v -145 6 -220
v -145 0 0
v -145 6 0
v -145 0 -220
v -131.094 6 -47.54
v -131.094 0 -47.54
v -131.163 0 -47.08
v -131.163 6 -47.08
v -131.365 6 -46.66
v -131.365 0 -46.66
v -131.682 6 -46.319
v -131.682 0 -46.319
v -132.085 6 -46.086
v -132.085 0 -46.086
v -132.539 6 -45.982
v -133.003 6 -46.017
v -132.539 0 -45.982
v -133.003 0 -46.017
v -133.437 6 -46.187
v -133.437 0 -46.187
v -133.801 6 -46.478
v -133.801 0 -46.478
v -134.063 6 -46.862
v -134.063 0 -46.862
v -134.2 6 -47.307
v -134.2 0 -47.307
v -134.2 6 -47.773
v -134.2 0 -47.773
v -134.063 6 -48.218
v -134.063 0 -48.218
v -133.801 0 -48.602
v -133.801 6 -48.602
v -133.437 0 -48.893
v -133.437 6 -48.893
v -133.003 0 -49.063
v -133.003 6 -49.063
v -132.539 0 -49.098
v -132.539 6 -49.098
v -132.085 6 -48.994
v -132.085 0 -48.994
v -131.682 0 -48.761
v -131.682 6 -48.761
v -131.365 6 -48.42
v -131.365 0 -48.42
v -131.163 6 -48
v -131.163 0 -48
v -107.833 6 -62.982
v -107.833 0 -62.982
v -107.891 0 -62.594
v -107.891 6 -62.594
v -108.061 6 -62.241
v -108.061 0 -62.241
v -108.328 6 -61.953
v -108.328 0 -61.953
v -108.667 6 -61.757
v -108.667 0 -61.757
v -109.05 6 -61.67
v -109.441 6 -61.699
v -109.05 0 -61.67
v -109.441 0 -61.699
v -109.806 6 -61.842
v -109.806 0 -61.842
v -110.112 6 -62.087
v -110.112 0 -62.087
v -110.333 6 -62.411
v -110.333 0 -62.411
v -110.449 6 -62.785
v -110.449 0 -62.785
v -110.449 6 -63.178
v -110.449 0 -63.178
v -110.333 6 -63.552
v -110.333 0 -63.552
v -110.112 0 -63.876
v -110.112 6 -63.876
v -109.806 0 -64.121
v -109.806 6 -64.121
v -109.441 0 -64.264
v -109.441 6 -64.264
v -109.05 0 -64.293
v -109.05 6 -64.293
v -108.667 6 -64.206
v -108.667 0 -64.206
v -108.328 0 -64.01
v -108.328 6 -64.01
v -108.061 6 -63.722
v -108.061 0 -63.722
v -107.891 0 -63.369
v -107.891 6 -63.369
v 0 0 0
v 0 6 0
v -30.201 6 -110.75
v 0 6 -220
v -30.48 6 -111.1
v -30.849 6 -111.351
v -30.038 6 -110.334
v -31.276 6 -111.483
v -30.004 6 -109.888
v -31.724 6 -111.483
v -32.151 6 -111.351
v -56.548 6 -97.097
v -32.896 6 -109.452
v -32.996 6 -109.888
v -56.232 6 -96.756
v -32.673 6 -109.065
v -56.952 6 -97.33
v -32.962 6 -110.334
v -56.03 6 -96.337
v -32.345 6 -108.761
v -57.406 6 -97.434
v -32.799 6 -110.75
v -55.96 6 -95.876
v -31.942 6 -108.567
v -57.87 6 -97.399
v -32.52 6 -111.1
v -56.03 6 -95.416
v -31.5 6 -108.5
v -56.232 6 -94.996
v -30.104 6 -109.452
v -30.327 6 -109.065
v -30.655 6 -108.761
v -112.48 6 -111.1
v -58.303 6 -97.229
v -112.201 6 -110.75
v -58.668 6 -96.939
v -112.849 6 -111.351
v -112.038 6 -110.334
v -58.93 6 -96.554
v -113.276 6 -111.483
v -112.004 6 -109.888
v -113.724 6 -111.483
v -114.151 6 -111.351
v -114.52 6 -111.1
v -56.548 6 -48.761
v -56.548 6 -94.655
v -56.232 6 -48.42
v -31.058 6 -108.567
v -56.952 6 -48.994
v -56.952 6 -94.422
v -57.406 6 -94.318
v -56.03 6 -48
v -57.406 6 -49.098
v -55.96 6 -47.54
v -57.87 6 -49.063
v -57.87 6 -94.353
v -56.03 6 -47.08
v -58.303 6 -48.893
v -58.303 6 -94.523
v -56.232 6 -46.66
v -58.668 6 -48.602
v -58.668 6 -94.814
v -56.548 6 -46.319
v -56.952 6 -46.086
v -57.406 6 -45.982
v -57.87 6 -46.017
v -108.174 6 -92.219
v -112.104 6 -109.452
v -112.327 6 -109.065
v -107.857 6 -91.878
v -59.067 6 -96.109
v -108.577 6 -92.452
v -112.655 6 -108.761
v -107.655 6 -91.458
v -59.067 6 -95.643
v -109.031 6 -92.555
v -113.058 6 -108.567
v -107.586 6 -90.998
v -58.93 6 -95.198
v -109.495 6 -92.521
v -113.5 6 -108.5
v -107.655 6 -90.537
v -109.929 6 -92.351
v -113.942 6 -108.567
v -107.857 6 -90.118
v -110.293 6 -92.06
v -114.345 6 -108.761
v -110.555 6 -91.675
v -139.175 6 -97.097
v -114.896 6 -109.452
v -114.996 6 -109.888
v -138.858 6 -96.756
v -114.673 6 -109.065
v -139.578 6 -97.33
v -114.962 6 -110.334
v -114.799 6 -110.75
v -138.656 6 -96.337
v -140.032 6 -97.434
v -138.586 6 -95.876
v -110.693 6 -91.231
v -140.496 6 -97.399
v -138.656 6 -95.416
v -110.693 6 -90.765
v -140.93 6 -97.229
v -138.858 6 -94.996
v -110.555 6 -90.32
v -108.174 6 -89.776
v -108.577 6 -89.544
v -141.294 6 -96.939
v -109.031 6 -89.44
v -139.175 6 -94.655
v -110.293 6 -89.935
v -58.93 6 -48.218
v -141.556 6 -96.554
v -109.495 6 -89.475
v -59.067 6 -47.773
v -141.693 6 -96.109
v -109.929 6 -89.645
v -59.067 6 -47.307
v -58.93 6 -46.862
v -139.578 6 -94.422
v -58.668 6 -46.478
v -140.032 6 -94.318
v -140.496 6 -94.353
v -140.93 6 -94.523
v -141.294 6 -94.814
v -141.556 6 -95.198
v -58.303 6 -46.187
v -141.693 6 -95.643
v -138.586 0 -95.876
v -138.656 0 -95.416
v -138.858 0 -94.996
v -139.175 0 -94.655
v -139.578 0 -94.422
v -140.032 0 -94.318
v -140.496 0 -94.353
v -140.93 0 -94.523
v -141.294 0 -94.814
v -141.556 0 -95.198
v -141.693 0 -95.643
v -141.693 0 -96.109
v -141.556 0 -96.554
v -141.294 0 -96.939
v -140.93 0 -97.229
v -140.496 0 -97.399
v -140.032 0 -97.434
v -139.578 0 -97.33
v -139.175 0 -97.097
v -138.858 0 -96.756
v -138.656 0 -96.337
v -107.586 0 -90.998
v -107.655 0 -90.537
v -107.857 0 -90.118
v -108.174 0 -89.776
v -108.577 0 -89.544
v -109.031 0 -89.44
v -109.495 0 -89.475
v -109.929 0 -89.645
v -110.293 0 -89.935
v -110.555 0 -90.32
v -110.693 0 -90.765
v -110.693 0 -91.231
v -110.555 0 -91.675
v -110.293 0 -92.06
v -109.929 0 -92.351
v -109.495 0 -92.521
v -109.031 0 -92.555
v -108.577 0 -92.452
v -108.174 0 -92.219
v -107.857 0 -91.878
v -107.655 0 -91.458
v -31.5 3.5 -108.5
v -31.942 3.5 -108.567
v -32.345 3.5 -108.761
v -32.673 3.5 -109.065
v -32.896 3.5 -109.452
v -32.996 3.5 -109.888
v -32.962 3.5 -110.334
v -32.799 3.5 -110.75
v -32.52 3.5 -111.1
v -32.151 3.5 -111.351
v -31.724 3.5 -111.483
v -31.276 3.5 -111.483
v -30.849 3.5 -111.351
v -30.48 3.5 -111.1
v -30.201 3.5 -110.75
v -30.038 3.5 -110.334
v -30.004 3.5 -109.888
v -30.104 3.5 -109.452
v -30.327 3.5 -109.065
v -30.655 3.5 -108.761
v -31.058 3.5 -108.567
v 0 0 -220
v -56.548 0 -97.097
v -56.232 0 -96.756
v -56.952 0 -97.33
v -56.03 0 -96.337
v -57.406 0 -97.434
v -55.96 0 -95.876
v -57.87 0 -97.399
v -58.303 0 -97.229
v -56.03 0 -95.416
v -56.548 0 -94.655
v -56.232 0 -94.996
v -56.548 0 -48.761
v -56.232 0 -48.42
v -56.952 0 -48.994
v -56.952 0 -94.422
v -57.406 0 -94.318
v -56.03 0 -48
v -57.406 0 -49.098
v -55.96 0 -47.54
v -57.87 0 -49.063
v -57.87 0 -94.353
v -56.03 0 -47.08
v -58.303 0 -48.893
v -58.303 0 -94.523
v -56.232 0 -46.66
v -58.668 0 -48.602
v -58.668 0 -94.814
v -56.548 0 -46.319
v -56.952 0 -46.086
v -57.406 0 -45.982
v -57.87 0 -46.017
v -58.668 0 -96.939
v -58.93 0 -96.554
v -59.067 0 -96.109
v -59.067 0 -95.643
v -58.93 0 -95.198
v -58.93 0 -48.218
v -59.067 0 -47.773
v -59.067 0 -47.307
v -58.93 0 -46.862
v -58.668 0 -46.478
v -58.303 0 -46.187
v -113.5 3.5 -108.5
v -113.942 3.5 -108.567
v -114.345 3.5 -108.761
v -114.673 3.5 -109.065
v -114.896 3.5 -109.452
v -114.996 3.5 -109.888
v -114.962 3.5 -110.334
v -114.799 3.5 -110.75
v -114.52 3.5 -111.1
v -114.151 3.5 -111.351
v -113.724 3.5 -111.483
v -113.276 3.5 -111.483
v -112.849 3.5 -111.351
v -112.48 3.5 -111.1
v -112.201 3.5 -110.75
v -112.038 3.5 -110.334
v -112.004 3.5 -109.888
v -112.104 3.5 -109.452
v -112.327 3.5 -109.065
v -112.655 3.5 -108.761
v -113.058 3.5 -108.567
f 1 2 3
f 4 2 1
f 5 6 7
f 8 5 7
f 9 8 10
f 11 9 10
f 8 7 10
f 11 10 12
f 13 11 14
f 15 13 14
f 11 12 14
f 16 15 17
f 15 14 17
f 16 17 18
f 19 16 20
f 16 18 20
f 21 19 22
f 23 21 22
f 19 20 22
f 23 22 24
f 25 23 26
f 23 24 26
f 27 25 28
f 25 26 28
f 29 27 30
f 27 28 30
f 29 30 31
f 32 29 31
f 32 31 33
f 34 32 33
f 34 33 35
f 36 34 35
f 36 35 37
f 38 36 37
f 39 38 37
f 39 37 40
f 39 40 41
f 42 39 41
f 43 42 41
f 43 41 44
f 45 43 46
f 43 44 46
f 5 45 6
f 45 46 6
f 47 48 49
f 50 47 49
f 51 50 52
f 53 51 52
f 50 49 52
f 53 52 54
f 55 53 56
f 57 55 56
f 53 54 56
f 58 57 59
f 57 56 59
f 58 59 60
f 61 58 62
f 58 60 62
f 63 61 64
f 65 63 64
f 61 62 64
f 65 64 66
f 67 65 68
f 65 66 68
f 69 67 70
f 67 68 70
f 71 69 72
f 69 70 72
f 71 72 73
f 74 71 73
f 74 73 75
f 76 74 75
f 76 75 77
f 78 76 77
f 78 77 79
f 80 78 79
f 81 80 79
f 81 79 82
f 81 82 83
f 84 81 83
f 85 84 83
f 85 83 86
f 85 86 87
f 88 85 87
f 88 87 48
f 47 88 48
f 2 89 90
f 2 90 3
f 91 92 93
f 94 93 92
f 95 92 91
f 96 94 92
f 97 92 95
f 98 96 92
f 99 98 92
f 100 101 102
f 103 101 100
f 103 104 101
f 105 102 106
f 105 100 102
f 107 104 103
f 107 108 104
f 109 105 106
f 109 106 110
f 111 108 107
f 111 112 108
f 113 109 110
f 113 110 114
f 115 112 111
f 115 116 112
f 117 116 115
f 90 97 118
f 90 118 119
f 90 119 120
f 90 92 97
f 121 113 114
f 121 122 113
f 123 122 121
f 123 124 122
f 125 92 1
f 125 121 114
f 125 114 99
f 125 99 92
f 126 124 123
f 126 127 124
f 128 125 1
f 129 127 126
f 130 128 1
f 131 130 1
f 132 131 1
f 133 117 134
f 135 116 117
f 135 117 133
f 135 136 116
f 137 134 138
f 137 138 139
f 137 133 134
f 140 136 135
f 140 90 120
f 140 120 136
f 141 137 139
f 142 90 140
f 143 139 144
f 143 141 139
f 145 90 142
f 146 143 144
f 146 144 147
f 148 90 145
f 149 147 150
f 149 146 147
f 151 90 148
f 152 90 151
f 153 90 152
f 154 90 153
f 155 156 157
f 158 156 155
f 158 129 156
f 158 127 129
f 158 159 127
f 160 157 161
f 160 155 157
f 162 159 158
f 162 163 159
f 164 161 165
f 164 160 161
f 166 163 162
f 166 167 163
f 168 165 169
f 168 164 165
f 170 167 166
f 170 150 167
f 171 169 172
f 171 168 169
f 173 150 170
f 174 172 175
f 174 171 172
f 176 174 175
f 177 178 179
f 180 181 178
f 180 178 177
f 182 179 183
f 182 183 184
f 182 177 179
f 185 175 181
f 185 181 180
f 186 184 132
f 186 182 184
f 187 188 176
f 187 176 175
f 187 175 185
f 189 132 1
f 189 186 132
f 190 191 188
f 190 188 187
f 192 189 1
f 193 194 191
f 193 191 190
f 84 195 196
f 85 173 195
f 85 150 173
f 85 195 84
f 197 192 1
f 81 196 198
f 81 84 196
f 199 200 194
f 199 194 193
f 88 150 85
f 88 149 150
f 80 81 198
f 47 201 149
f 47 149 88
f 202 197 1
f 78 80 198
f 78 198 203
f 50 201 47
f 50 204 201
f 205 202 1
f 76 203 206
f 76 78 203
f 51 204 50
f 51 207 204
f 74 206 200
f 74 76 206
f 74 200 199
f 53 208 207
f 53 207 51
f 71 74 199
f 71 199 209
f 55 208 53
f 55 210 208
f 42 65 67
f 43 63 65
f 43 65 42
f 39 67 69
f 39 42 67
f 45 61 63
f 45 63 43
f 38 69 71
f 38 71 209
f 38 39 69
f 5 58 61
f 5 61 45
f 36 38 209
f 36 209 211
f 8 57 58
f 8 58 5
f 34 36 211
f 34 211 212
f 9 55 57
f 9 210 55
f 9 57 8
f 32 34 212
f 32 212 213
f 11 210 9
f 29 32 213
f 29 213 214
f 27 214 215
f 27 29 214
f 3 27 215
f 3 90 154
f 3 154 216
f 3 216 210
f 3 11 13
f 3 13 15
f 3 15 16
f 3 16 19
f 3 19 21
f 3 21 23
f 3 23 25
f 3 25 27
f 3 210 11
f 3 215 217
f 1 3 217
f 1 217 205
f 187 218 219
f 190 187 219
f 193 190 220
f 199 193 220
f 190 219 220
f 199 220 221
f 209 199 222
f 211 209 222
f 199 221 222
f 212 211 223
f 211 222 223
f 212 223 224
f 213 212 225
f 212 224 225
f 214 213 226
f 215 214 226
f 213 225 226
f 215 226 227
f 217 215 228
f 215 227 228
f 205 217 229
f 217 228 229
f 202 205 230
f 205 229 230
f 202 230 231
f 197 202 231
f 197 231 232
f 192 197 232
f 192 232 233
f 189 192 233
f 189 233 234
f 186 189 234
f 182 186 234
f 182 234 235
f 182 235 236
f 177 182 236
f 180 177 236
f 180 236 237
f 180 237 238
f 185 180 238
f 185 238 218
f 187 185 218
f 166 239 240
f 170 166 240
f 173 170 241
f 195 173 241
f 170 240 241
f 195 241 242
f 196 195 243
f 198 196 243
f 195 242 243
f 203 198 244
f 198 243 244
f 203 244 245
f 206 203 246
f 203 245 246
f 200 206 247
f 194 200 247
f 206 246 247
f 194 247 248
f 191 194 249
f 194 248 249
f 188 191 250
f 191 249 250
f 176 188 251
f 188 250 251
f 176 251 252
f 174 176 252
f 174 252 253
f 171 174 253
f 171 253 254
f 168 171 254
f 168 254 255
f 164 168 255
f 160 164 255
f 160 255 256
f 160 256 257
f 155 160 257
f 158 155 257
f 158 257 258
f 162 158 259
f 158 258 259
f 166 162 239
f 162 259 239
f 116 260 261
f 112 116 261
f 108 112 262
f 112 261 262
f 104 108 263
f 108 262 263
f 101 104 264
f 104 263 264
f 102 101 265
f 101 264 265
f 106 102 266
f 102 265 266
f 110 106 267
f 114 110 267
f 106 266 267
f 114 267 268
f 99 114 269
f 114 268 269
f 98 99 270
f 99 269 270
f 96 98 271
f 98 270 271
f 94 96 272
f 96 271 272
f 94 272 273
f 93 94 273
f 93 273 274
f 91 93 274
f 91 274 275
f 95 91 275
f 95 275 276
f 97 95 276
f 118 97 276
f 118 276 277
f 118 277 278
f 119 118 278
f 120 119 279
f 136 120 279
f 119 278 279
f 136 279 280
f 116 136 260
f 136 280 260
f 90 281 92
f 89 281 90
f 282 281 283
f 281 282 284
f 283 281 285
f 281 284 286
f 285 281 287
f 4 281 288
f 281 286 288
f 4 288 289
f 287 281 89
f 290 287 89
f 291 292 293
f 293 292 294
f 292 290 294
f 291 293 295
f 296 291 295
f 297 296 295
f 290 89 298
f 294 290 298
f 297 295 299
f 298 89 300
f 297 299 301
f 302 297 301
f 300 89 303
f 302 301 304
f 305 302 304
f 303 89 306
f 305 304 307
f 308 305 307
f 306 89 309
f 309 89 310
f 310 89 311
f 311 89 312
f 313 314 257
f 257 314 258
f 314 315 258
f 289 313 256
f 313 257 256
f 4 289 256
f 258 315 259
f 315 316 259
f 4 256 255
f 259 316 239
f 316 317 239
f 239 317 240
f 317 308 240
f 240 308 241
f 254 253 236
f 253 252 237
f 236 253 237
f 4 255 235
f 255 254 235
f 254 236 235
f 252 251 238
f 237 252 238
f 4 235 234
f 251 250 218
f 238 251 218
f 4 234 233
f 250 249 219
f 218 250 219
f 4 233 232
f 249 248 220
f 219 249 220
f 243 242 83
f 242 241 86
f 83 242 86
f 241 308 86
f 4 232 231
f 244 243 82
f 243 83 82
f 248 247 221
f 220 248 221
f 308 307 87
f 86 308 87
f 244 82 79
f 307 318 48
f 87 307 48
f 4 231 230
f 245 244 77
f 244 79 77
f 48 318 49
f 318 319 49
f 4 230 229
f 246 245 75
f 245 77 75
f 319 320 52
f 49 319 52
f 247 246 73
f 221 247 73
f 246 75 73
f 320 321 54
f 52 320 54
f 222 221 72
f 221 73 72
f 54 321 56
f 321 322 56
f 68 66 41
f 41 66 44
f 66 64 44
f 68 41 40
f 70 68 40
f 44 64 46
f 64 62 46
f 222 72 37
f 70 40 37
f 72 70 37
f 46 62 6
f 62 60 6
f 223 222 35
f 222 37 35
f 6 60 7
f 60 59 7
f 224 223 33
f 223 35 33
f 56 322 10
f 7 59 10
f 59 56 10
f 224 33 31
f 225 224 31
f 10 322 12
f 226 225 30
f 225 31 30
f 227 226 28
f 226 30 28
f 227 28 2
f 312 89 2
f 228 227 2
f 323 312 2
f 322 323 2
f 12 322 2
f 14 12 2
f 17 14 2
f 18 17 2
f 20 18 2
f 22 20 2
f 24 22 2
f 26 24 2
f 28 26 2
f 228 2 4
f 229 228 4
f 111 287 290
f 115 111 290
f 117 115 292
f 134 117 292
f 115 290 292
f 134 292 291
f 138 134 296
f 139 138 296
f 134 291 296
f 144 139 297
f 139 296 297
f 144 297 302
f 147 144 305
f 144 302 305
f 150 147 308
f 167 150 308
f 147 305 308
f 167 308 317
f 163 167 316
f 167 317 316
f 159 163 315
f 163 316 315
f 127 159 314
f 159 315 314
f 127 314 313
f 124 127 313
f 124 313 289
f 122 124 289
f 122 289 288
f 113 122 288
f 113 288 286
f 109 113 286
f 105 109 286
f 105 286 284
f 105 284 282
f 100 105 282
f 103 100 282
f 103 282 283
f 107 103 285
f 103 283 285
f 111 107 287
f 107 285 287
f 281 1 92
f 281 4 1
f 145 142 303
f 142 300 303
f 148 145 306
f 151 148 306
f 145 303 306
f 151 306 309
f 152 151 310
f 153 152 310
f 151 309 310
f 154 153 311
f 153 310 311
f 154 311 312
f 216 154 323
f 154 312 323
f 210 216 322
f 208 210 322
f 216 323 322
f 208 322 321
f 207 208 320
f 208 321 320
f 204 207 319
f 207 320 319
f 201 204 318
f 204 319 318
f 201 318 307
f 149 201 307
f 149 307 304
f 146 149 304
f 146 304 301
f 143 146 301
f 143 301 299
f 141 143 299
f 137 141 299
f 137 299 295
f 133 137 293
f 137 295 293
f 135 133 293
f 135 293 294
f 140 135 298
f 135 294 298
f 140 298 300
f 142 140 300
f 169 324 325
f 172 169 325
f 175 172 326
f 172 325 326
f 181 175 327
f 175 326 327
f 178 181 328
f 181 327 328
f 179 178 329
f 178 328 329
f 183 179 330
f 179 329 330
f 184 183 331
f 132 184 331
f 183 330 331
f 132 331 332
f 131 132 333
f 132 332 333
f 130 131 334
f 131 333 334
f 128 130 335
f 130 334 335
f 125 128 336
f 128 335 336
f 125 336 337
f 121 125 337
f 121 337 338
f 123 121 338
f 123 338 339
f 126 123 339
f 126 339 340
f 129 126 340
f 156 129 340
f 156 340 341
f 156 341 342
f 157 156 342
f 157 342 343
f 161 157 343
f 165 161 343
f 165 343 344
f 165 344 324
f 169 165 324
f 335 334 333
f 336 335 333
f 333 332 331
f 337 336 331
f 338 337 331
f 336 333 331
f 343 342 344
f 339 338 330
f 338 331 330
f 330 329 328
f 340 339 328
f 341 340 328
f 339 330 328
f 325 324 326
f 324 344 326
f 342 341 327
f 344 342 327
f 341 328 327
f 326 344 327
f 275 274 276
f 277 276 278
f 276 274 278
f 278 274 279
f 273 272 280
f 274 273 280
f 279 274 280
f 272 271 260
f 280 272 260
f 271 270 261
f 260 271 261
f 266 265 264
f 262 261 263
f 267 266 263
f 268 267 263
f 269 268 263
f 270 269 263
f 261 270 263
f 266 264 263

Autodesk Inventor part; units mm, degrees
ref_plane "YZ Plane" through (0, 0, 0) normal (1, 0, 0) x (0, 1, 0)
ref_plane "XZ Plane" through (0, 0, 0) normal (0, 1, 0) x (-1, 0, 0)
ref_plane "XY Plane" through (0, 0, 0) normal (0, 0, 1) x (1, 0, 0)
sketch "Sketch1" plane through (0, 0, 0) normal (0, 1, 0) x (-1, 0, 0)
  line L0 (0, 0) -> (145, 0)
  line L1 (145, 0) -> (145, -220)
  line L2 (145, -220) -> (0, -220)
  line L3 (0, -220) -> (0, 0)
  dimension "d0" = 145
  dimension "d1" = 220
extrude "Extrusion1" add sketch "Sketch1" along normal blind 6
sketch "Sketch2" plane through (0, 6, 0) normal (0, 1, 0) x (1, 0, 0)
  line L0 (-145, 220) -> (-145, 0) projected
  line L1 (0, 0) -> (0, 220) projected
  line L2 (0, 220) -> (-145, 220) projected
  point P0 (-113.5, 110)
  point P1 (-31.5, 110)
  dimension "d4" = 31.5
  dimension "d5" = 31.5
  dimension "d6" = 110
  dimension "d7" = 110
hole "Hole1" at (-113.5, 6, -110) at (-31.5, 6, -110) direction (0, -1, 0) diameter 3 depth 2.5
sketch "Sketch3" plane through (0, 0, 0) normal (0, -1, 0) x (1, 0, 0)
  line L0 (0, 0) -> (-145, 0)
  line L1 (-145, 0) -> (-145, -220)
  line L2 (-145, -220) -> (0, -220)
  line L3 (0, -220) -> (0, 0)
  circle A0 centre (-132.6556, -47.54) radius 1.5621
  circle A1 centre (-109.1479, -62.9815) radius 1.3153
  circle A2 centre (-109.1479, -90.9977) radius 1.5621
  circle A3 centre (-140.1486, -95.8762) radius 1.5621
  circle A4 centre (-57.5224, -95.8762) radius 1.5621
  circle A5 centre (-57.5224, -47.54) radius 1.5621
  circle A6 centre (-132.6556, -47.54) radius 1.5621
  circle A7 centre (-140.1486, -95.8762) radius 1.5621
  circle A8 centre (-109.1479, -90.9977) radius 1.5621
  circle A9 centre (-109.1479, -62.9815) radius 1.3153
  circle A10 centre (-57.5224, -47.54) radius 1.5621
  circle A11 centre (-57.5224, -95.8762) radius 1.5621
extrude "Extrusion2" cut sketch "Sketch3" against normal up to next contours A0 | A1 | A2 | A3 | A4 | A5
equation "\"d5\" = d4"
properties part number "base plate"
